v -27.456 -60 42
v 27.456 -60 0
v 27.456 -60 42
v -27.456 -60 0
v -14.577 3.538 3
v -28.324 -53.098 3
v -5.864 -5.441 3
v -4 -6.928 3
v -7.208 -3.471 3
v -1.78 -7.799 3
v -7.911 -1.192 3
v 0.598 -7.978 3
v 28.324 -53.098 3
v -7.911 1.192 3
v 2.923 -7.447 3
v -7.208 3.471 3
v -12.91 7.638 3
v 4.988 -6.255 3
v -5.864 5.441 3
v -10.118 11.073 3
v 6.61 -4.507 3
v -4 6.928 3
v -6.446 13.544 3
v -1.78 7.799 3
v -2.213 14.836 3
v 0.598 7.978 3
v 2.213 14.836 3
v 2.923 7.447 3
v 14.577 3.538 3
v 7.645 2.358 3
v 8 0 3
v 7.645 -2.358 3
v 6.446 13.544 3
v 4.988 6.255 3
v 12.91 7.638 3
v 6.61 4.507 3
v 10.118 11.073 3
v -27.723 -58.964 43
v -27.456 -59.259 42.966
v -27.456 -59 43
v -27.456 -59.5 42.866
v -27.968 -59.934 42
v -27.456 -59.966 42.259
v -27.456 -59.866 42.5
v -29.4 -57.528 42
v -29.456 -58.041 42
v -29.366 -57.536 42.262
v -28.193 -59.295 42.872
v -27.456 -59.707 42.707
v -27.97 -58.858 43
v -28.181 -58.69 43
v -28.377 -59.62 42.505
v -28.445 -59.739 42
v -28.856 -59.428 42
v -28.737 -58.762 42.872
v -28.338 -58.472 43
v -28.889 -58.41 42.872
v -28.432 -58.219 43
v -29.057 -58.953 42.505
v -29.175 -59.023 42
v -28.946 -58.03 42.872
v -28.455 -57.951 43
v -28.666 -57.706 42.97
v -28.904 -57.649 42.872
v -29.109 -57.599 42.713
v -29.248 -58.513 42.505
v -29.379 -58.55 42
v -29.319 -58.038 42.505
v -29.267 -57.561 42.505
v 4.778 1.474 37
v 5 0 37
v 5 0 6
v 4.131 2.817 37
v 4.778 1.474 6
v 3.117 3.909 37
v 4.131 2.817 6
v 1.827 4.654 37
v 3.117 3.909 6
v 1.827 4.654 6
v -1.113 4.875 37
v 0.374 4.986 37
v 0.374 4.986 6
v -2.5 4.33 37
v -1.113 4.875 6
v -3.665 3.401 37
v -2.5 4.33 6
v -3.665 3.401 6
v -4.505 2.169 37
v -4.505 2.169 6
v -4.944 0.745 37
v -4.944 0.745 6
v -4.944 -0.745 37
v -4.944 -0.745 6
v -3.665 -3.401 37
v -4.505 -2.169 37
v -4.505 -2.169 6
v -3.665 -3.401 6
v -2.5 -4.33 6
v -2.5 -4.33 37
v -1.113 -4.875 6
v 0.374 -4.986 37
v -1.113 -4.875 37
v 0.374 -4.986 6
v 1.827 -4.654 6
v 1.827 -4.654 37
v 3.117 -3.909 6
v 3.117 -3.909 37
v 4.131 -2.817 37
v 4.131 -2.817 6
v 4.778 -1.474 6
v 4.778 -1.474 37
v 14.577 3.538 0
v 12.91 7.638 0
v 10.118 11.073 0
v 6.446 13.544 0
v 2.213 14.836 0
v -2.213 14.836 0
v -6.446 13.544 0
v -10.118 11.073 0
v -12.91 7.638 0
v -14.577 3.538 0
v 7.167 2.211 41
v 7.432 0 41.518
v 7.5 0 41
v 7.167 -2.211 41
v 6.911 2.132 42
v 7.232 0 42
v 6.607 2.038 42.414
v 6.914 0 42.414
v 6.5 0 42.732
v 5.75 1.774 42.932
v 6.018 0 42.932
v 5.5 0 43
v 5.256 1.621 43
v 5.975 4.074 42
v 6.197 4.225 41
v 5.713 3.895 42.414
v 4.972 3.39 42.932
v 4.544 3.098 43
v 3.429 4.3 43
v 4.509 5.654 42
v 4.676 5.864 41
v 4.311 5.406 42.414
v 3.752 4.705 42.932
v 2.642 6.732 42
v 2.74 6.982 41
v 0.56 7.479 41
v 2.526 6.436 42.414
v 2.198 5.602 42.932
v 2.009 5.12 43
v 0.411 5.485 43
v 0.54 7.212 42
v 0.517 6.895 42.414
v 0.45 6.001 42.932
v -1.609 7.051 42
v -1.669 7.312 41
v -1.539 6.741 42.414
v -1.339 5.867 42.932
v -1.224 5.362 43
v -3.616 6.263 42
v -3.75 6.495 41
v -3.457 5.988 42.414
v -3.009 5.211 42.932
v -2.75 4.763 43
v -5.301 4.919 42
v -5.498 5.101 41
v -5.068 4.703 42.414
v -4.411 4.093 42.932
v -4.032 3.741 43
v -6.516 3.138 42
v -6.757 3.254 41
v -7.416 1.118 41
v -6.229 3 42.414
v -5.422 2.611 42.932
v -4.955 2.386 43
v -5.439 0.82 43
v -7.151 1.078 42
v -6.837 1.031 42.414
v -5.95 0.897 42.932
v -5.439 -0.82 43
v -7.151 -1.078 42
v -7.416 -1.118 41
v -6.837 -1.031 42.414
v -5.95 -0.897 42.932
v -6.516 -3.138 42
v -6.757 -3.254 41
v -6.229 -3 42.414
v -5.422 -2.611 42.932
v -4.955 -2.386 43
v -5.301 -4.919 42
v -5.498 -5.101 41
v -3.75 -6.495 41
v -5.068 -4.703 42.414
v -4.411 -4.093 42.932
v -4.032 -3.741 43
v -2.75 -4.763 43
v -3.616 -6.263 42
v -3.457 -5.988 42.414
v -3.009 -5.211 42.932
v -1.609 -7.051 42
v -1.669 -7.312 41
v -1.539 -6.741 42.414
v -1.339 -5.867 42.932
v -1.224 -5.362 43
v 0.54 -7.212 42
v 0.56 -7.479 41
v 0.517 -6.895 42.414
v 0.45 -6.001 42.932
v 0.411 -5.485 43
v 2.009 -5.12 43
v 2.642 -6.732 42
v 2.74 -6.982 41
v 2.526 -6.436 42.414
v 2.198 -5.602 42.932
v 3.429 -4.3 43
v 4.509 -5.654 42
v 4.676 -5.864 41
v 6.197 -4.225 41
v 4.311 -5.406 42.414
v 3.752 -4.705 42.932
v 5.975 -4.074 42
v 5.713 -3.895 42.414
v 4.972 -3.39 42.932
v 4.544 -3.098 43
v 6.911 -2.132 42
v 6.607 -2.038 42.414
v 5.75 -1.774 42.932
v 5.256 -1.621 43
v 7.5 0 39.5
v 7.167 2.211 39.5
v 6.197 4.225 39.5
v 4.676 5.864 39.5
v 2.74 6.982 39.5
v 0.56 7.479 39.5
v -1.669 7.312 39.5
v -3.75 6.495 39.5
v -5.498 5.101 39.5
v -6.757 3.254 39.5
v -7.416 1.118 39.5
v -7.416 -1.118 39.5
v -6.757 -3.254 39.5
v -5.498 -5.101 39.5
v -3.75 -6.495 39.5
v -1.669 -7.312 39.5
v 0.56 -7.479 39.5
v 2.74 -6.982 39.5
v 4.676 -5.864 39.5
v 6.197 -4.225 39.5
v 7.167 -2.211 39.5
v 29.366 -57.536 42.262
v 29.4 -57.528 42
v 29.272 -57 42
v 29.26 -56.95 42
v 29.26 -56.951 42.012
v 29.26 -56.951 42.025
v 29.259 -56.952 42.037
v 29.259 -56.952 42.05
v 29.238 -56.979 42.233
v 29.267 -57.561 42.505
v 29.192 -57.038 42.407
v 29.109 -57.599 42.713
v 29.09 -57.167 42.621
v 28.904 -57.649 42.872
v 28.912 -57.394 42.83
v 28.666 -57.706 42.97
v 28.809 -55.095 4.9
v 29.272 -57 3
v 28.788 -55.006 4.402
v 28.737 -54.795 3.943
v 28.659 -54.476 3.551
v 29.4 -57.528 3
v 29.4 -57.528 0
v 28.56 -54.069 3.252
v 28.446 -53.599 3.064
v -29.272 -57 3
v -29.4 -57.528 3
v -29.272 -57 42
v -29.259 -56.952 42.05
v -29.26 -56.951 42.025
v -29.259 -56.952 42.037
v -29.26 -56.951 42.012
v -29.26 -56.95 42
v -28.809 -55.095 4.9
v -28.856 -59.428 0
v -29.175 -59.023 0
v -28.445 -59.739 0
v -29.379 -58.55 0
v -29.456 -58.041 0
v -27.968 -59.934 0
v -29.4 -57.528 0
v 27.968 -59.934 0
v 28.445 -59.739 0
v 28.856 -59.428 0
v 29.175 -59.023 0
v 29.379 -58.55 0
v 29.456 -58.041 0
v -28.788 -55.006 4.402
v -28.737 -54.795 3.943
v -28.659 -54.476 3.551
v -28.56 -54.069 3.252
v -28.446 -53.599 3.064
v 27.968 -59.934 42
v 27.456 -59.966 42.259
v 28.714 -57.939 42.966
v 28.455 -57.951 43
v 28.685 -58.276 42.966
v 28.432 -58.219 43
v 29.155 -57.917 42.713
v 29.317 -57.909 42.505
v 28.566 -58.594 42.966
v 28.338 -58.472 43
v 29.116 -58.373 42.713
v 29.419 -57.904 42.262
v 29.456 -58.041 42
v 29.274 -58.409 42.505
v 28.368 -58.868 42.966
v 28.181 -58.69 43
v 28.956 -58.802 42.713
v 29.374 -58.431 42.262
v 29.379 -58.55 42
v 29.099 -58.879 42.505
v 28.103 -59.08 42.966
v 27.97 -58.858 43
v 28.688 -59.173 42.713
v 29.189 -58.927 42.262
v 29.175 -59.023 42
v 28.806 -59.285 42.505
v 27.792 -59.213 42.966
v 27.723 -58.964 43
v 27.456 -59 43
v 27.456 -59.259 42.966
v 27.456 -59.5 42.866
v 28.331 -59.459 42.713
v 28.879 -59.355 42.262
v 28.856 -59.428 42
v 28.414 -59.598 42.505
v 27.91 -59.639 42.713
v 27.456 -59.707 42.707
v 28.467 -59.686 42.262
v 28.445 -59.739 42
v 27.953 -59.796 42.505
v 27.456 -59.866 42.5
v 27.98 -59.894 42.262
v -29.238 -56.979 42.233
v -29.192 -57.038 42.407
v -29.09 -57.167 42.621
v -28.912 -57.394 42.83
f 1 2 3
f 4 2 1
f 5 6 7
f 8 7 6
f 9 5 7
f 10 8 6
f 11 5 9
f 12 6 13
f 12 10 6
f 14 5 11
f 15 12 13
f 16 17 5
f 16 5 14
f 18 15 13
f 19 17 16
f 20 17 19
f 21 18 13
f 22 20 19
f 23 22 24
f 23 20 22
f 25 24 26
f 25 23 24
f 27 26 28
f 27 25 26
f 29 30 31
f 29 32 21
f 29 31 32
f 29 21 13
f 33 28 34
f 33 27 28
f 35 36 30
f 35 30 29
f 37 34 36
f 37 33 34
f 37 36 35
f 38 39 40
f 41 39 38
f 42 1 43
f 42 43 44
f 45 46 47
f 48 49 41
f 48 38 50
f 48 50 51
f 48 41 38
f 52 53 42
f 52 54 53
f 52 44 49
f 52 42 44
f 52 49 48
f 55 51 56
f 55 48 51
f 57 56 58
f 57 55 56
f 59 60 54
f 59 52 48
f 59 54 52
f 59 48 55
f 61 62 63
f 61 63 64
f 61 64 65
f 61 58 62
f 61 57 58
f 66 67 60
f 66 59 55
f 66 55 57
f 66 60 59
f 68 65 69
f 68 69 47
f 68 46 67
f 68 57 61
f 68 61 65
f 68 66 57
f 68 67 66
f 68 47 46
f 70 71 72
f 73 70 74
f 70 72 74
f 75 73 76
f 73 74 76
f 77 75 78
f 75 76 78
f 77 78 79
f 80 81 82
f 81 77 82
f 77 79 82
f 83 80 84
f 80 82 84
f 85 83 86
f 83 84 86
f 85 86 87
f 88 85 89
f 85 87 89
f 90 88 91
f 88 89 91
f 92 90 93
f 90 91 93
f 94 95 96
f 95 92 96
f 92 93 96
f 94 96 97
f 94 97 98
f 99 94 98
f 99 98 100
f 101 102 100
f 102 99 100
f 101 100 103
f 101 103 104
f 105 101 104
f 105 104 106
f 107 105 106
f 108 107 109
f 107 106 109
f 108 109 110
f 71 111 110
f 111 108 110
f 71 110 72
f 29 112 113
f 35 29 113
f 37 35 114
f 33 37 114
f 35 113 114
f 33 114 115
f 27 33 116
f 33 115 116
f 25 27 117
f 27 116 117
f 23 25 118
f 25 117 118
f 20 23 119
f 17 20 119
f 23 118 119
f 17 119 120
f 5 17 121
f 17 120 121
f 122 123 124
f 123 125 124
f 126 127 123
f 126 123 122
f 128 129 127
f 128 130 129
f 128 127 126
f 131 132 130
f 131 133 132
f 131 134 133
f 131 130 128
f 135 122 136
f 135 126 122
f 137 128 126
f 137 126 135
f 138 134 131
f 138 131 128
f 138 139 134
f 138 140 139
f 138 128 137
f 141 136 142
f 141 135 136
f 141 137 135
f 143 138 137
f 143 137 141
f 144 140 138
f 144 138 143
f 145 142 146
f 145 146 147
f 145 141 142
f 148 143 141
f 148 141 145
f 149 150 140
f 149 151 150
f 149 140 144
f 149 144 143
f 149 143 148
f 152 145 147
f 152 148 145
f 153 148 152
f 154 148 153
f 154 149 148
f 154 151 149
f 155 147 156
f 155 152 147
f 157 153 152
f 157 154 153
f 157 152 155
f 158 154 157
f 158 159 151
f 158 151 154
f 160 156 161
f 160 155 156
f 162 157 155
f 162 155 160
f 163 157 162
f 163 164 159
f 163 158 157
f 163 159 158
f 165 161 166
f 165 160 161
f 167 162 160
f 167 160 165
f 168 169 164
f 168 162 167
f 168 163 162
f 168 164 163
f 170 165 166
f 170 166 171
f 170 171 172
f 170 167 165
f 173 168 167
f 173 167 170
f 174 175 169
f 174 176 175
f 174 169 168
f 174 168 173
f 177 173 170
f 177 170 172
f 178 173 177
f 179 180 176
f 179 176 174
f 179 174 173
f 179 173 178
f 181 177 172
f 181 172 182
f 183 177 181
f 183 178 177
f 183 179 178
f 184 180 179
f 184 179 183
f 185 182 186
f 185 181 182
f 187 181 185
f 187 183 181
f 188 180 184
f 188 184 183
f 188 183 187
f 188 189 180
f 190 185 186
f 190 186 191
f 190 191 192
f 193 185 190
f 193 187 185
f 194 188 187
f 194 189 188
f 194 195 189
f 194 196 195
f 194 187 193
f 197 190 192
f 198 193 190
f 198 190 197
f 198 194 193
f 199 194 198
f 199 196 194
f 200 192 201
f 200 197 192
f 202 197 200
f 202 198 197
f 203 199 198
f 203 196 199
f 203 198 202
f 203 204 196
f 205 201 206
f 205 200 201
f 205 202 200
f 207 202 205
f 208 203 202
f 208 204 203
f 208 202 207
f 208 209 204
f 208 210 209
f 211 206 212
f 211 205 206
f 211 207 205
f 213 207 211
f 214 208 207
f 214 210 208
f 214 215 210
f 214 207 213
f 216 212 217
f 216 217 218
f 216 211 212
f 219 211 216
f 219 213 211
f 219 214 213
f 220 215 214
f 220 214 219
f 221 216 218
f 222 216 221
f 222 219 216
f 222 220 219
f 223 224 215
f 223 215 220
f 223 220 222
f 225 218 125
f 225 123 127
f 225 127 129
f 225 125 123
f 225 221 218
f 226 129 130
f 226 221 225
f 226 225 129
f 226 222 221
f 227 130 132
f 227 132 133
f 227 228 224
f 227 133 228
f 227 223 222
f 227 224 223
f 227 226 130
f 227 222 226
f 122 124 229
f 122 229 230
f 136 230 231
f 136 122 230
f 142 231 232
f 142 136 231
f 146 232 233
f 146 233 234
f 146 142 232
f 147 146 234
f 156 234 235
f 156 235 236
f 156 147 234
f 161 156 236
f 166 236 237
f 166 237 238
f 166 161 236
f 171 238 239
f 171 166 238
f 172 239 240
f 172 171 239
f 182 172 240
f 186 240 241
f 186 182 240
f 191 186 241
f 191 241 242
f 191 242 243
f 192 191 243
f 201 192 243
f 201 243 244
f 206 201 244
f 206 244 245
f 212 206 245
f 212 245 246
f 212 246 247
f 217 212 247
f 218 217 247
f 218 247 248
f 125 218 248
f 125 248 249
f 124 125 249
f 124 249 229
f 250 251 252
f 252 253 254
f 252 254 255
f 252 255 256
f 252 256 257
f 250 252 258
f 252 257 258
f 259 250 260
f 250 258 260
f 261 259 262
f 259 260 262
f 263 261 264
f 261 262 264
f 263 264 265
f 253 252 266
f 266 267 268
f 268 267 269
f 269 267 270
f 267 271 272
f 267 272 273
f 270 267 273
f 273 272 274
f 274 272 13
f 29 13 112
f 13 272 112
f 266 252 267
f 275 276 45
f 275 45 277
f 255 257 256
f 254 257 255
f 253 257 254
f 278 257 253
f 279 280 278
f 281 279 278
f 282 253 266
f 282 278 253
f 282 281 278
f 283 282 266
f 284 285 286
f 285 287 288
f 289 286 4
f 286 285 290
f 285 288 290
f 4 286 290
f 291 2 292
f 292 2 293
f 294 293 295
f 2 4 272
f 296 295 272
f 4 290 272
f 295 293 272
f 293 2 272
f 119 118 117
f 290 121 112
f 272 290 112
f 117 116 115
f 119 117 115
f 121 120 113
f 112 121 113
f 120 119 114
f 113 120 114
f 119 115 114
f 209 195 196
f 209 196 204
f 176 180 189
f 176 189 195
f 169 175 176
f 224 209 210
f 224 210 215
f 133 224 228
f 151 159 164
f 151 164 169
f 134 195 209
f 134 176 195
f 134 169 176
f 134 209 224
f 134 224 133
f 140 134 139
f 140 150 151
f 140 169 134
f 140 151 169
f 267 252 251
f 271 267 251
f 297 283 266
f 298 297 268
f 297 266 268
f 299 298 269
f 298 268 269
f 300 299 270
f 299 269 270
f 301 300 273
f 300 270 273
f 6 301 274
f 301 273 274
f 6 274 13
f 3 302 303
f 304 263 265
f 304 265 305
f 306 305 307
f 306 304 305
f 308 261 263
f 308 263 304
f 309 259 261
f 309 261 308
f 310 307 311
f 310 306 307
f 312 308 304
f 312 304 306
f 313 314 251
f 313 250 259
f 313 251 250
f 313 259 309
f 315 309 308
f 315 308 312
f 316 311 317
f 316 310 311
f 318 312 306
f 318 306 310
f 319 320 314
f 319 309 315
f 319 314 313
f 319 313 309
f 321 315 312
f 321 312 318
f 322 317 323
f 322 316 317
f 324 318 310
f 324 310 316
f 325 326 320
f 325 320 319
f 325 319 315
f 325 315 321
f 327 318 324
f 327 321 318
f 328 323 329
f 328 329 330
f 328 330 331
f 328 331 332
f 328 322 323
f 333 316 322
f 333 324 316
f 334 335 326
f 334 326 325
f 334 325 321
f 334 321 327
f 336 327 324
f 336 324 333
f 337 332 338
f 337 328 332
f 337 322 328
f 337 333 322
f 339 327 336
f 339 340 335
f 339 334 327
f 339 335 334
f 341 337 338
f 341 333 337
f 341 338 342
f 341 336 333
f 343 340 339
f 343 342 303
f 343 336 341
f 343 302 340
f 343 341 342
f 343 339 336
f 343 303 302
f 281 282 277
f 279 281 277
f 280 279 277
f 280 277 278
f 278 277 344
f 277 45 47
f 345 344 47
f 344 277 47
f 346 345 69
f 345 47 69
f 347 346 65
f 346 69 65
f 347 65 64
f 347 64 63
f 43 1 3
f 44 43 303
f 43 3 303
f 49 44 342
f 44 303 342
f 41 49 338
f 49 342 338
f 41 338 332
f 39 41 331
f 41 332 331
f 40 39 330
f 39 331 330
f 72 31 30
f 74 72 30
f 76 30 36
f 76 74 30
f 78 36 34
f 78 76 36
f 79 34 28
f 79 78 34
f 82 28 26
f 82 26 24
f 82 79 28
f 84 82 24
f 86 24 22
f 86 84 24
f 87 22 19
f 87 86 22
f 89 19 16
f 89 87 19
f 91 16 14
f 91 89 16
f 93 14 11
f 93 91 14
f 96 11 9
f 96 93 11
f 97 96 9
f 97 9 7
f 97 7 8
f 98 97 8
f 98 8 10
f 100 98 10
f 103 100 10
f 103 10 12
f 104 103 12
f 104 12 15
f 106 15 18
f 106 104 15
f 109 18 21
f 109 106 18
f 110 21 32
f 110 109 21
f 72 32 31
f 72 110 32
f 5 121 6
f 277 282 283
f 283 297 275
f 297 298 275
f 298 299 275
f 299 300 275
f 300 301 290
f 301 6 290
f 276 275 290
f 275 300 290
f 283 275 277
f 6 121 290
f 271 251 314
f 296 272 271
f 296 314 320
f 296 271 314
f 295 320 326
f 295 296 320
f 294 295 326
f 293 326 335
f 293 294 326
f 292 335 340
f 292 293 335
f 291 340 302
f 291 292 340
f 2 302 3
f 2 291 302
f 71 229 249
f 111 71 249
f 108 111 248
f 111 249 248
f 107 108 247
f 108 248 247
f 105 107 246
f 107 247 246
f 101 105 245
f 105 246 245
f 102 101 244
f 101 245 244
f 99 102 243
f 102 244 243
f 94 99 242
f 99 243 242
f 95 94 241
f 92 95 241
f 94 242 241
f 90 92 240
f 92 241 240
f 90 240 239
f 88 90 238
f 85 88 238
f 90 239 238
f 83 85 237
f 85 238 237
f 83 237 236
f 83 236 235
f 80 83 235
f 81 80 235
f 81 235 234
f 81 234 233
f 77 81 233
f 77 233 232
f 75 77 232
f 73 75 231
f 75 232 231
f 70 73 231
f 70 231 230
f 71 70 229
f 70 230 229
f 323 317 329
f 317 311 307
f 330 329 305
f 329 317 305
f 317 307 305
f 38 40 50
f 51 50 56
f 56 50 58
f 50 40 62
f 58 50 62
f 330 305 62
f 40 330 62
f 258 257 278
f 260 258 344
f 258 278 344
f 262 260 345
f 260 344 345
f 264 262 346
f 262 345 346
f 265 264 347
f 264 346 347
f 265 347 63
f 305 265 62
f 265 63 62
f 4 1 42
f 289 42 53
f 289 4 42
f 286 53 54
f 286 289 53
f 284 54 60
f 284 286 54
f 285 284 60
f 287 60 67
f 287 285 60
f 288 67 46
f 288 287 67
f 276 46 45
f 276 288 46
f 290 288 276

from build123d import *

# Parameters (mm, degrees)
EXTRUDE_1_DEPTH      = 3
SKETCH_2_R           = 5
EXTRUDE_2_DEPTH      = 40
SKETCH_3_R           = 7.5
EXTRUDE_3_DEPTH      = 3
CHAMFER_1_SIZE       = 3
EXTRUDE_4_DEPTH      = 40
EXTRUDE_5_DEPTH      = 30
EXTRUDE_5_DEPTH_BACK = 30
SKETCH_1_2_OUTSIDE_W = 83.046
SKETCH_1_2_OUTSIDE_H = 98.046
CUT_EXTRUDE_1_DEPTH  = 80.680612447
FILLET_1_R           = 2
FILLET_2_R           = 1
FILLET_3_R           = 2


with BuildPart() as part:
    # 草图1 → 凸台-拉伸1 (new body)
    with BuildSketch(Plane.XY):
        with BuildLine():
            Line((-14.576696831, 3.538348415), (-29.4, -57.528220211))
            ThreePointArc((-29.4, -57.528220211), (-29.028629911, -59.236212041), (-27.456440423, -60))
            Line((-27.456440423, -60), (27.456440423, -60))
            ThreePointArc((27.456440423, -60), (29.028629911, -59.236212041), (29.4, -57.528220211))
            Line((29.4, -57.528220211), (14.576696831, 3.538348415))
            ThreePointArc((14.576696831, 3.538348415), (0, 15), (-14.576696831, 3.538348415))
        make_face()
    extrude(amount=EXTRUDE_1_DEPTH)

    # 草图2 → 凸台-拉伸2 (add)
    with BuildSketch(Plane.XY.offset(3)):
        Circle(SKETCH_2_R)
    extrude(amount=EXTRUDE_2_DEPTH)

    # 草图3 → 凸台-拉伸3 (add)
    with BuildSketch(Plane.XY.offset(43)):
        Circle(SKETCH_3_R)
    extrude(amount=-EXTRUDE_3_DEPTH)

    # 倒角1
    # the kernel refuses this chamfer: 3 mm, written as the material it adds along each edge
    with BuildSketch(Plane(origin=(0, 0, 40), x_dir=(1, 0, 0), z_dir=(0, 1, 0))) as chamfer_1_piece_1_section:
        Polygon((5, CHAMFER_1_SIZE), (5 + CHAMFER_1_SIZE, 0), (5, 0), align=None)
    chamfer_1_piece_1 = revolve(axis=Axis((0, 0, 40), (0, 0, -1)), mode=Mode.PRIVATE)
    chamfer_1_piece_1 = chamfer_1_piece_1 & Plane(origin=(0, 0, 38.247274928), x_dir=(1, 0, 0), z_dir=(0, 0, 1)) * Cylinder(7.5, 32, mode=Mode.PRIVATE)
    add(chamfer_1_piece_1)
    with BuildSketch(Plane(origin=(0, 0, 3), x_dir=(1, 0, 0), z_dir=(0, -1, 0))) as chamfer_1_piece_2:
        Polygon((5 + CHAMFER_1_SIZE, 0), (5, CHAMFER_1_SIZE), (5, 0), align=None)
    revolve(axis=Axis((0, 0, 3), (0, 0, 1)))

    # 草图4 → 凸台-拉伸4 (add)
    with BuildSketch(Plane.XY.offset(3)):
        with BuildLine():
            Line((-29.271779789, -57), (29.271779789, -57))
            Line((29.271779789, -57), (29.4, -57.528220211))
            ThreePointArc((29.4, -57.528220211), (29.028629911, -59.236212041), (27.456440423, -60))
            Line((27.456440423, -60), (-27.456440423, -60))
            ThreePointArc((-27.456440423, -60), (-29.028629911, -59.236212041), (-29.4, -57.528220211))
            Line((-29.4, -57.528220211), (-29.271779789, -57))
        make_face()
    extrude(amount=EXTRUDE_4_DEPTH)

    # 草图6 → 凸台-拉伸5 (add, two sides: drawn at the far end of the back side and taken through both)
    with BuildSketch(Plane(origin=(0, 0, 0), x_dir=(0, 0, -1), z_dir=(1, 0, 0)).offset(-EXTRUDE_5_DEPTH_BACK)):
        Polygon((-43, -57), (-3, -55), (-3, -57), align=None)
    extrude(amount=EXTRUDE_5_DEPTH + EXTRUDE_5_DEPTH_BACK)

    # 草图1<2> outside → 切除-拉伸1 (cut, through all)
    with BuildSketch(Plane.XY):
        with Locations((0, -22.5)):
            Rectangle(SKETCH_1_2_OUTSIDE_W, SKETCH_1_2_OUTSIDE_H)
        with BuildLine():
            Line((-14.576696831, 3.538348415), (-29.4, -57.528220211))
            ThreePointArc((-29.4, -57.528220211), (-29.028629911, -59.236212041), (-27.456440423, -60))
            Line((-27.456440423, -60), (27.456440423, -60))
            ThreePointArc((27.456440423, -60), (29.028629911, -59.236212041), (29.4, -57.528220211))
            Line((29.4, -57.528220211), (14.576696831, 3.538348415))
            ThreePointArc((14.576696831, 3.538348415), (0, 15), (-14.576696831, 3.538348415))
        make_face(mode=Mode.SUBTRACT)
    extrude(amount=CUT_EXTRUDE_1_DEPTH, mode=Mode.SUBTRACT)

    # 圆角1
    fillet_1_edges = [part.edges().sort_by_distance(p)[0] for p in [
        (0, -55, 3),
    ]]
    fillet(fillet_1_edges, radius=FILLET_1_R)

    # 圆角2
    # the kernel refuses this fillet: 1 mm, written as the material it takes off along each edge
    with BuildSketch(Plane(origin=(27.456440423, -58, 43), x_dir=(0.971779788708135, 0.23588989435406618, 0), z_dir=(-0.23588989435406618, 0.971779788708135, 0))) as fillet_2_piece_1:
        with BuildLine():
            CenterArc((2 - FILLET_2_R, FILLET_2_R), FILLET_2_R, 270, 90)
            Line((2, FILLET_2_R), (2, 0))
            Line((2, 0), (2 - FILLET_2_R, 0))
        make_face()
    revolve(axis=Axis((27.456440423, -58, 43), (0, 0, -1)), revolution_arc=103.644084795, mode=Mode.SUBTRACT)
    with BuildSketch(Plane(origin=(27.456440423, -60, 43), x_dir=(0, 1, 0), z_dir=(-1, 0, 0))) as fillet_2_piece_2:
        with BuildLine():
            CenterArc((FILLET_2_R, FILLET_2_R), FILLET_2_R, 180, 90)
            Line((0, FILLET_2_R), (0, 0))
            Line((0, 0), (FILLET_2_R, 0))
        make_face()
    extrude(amount=54.912880845, mode=Mode.SUBTRACT)
    with BuildSketch(Plane(origin=(-27.456440423, -58, 43), x_dir=(0, -1, 0), z_dir=(1, 0, 0))) as fillet_2_piece_3:
        with BuildLine():
            CenterArc((2 - FILLET_2_R, FILLET_2_R), FILLET_2_R, 270, 90)
            Line((2, FILLET_2_R), (2, 0))
            Line((2, 0), (2 - FILLET_2_R, 0))
        make_face()
    revolve(axis=Axis((-27.456440423, -58, 43), (0, 0, -1)), revolution_arc=103.644084795, mode=Mode.SUBTRACT)
    with BuildSketch(Plane(origin=(-31.649902838, -57, 43), x_dir=(0, 0.049937616943894474, -0.9987523388778445), z_dir=(1, 0, 0))) as fillet_2_piece_4:
        with BuildLine():
            CenterArc((FILLET_2_R * 0.951249219725, -FILLET_2_R), FILLET_2_R, 90, 87.137594774)
            Line((-FILLET_2_R * 0.0475031191528, -FILLET_2_R * 0.950062383056), (0, 0))
            Line((0, 0), (FILLET_2_R * 0.951249219725, 0))
        make_face()
    extrude(amount=63.299805676, mode=Mode.SUBTRACT)
    with BuildSketch(Plane(origin=(-29.4, -57.528220211, 43), x_dir=(0, 0, -1), z_dir=(0.23588989435405947, 0.9717797887081366, 0)), Plane(origin=(28.682055053, -54.570550528, 43), x_dir=(0, 0, -1), z_dir=(0.2358898943540625, -0.971779788708136, 0))) as fillet_2_piece_5:
        with BuildLine():
            CenterArc((FILLET_2_R, -FILLET_2_R), FILLET_2_R, 90, 90)
            Line((0, -FILLET_2_R), (0, 0))
            Line((0, 0), (FILLET_2_R, 0))
        make_face()
    extrude(amount=3.043559577, mode=Mode.SUBTRACT)

    # 圆角3
    fillet_3_edges = [part.edges().sort_by_distance(p)[0] for p in [
        (-7.5, 0, 43),
    ]]
    fillet(fillet_3_edges, radius=FILLET_3_R)


solid = part.part
